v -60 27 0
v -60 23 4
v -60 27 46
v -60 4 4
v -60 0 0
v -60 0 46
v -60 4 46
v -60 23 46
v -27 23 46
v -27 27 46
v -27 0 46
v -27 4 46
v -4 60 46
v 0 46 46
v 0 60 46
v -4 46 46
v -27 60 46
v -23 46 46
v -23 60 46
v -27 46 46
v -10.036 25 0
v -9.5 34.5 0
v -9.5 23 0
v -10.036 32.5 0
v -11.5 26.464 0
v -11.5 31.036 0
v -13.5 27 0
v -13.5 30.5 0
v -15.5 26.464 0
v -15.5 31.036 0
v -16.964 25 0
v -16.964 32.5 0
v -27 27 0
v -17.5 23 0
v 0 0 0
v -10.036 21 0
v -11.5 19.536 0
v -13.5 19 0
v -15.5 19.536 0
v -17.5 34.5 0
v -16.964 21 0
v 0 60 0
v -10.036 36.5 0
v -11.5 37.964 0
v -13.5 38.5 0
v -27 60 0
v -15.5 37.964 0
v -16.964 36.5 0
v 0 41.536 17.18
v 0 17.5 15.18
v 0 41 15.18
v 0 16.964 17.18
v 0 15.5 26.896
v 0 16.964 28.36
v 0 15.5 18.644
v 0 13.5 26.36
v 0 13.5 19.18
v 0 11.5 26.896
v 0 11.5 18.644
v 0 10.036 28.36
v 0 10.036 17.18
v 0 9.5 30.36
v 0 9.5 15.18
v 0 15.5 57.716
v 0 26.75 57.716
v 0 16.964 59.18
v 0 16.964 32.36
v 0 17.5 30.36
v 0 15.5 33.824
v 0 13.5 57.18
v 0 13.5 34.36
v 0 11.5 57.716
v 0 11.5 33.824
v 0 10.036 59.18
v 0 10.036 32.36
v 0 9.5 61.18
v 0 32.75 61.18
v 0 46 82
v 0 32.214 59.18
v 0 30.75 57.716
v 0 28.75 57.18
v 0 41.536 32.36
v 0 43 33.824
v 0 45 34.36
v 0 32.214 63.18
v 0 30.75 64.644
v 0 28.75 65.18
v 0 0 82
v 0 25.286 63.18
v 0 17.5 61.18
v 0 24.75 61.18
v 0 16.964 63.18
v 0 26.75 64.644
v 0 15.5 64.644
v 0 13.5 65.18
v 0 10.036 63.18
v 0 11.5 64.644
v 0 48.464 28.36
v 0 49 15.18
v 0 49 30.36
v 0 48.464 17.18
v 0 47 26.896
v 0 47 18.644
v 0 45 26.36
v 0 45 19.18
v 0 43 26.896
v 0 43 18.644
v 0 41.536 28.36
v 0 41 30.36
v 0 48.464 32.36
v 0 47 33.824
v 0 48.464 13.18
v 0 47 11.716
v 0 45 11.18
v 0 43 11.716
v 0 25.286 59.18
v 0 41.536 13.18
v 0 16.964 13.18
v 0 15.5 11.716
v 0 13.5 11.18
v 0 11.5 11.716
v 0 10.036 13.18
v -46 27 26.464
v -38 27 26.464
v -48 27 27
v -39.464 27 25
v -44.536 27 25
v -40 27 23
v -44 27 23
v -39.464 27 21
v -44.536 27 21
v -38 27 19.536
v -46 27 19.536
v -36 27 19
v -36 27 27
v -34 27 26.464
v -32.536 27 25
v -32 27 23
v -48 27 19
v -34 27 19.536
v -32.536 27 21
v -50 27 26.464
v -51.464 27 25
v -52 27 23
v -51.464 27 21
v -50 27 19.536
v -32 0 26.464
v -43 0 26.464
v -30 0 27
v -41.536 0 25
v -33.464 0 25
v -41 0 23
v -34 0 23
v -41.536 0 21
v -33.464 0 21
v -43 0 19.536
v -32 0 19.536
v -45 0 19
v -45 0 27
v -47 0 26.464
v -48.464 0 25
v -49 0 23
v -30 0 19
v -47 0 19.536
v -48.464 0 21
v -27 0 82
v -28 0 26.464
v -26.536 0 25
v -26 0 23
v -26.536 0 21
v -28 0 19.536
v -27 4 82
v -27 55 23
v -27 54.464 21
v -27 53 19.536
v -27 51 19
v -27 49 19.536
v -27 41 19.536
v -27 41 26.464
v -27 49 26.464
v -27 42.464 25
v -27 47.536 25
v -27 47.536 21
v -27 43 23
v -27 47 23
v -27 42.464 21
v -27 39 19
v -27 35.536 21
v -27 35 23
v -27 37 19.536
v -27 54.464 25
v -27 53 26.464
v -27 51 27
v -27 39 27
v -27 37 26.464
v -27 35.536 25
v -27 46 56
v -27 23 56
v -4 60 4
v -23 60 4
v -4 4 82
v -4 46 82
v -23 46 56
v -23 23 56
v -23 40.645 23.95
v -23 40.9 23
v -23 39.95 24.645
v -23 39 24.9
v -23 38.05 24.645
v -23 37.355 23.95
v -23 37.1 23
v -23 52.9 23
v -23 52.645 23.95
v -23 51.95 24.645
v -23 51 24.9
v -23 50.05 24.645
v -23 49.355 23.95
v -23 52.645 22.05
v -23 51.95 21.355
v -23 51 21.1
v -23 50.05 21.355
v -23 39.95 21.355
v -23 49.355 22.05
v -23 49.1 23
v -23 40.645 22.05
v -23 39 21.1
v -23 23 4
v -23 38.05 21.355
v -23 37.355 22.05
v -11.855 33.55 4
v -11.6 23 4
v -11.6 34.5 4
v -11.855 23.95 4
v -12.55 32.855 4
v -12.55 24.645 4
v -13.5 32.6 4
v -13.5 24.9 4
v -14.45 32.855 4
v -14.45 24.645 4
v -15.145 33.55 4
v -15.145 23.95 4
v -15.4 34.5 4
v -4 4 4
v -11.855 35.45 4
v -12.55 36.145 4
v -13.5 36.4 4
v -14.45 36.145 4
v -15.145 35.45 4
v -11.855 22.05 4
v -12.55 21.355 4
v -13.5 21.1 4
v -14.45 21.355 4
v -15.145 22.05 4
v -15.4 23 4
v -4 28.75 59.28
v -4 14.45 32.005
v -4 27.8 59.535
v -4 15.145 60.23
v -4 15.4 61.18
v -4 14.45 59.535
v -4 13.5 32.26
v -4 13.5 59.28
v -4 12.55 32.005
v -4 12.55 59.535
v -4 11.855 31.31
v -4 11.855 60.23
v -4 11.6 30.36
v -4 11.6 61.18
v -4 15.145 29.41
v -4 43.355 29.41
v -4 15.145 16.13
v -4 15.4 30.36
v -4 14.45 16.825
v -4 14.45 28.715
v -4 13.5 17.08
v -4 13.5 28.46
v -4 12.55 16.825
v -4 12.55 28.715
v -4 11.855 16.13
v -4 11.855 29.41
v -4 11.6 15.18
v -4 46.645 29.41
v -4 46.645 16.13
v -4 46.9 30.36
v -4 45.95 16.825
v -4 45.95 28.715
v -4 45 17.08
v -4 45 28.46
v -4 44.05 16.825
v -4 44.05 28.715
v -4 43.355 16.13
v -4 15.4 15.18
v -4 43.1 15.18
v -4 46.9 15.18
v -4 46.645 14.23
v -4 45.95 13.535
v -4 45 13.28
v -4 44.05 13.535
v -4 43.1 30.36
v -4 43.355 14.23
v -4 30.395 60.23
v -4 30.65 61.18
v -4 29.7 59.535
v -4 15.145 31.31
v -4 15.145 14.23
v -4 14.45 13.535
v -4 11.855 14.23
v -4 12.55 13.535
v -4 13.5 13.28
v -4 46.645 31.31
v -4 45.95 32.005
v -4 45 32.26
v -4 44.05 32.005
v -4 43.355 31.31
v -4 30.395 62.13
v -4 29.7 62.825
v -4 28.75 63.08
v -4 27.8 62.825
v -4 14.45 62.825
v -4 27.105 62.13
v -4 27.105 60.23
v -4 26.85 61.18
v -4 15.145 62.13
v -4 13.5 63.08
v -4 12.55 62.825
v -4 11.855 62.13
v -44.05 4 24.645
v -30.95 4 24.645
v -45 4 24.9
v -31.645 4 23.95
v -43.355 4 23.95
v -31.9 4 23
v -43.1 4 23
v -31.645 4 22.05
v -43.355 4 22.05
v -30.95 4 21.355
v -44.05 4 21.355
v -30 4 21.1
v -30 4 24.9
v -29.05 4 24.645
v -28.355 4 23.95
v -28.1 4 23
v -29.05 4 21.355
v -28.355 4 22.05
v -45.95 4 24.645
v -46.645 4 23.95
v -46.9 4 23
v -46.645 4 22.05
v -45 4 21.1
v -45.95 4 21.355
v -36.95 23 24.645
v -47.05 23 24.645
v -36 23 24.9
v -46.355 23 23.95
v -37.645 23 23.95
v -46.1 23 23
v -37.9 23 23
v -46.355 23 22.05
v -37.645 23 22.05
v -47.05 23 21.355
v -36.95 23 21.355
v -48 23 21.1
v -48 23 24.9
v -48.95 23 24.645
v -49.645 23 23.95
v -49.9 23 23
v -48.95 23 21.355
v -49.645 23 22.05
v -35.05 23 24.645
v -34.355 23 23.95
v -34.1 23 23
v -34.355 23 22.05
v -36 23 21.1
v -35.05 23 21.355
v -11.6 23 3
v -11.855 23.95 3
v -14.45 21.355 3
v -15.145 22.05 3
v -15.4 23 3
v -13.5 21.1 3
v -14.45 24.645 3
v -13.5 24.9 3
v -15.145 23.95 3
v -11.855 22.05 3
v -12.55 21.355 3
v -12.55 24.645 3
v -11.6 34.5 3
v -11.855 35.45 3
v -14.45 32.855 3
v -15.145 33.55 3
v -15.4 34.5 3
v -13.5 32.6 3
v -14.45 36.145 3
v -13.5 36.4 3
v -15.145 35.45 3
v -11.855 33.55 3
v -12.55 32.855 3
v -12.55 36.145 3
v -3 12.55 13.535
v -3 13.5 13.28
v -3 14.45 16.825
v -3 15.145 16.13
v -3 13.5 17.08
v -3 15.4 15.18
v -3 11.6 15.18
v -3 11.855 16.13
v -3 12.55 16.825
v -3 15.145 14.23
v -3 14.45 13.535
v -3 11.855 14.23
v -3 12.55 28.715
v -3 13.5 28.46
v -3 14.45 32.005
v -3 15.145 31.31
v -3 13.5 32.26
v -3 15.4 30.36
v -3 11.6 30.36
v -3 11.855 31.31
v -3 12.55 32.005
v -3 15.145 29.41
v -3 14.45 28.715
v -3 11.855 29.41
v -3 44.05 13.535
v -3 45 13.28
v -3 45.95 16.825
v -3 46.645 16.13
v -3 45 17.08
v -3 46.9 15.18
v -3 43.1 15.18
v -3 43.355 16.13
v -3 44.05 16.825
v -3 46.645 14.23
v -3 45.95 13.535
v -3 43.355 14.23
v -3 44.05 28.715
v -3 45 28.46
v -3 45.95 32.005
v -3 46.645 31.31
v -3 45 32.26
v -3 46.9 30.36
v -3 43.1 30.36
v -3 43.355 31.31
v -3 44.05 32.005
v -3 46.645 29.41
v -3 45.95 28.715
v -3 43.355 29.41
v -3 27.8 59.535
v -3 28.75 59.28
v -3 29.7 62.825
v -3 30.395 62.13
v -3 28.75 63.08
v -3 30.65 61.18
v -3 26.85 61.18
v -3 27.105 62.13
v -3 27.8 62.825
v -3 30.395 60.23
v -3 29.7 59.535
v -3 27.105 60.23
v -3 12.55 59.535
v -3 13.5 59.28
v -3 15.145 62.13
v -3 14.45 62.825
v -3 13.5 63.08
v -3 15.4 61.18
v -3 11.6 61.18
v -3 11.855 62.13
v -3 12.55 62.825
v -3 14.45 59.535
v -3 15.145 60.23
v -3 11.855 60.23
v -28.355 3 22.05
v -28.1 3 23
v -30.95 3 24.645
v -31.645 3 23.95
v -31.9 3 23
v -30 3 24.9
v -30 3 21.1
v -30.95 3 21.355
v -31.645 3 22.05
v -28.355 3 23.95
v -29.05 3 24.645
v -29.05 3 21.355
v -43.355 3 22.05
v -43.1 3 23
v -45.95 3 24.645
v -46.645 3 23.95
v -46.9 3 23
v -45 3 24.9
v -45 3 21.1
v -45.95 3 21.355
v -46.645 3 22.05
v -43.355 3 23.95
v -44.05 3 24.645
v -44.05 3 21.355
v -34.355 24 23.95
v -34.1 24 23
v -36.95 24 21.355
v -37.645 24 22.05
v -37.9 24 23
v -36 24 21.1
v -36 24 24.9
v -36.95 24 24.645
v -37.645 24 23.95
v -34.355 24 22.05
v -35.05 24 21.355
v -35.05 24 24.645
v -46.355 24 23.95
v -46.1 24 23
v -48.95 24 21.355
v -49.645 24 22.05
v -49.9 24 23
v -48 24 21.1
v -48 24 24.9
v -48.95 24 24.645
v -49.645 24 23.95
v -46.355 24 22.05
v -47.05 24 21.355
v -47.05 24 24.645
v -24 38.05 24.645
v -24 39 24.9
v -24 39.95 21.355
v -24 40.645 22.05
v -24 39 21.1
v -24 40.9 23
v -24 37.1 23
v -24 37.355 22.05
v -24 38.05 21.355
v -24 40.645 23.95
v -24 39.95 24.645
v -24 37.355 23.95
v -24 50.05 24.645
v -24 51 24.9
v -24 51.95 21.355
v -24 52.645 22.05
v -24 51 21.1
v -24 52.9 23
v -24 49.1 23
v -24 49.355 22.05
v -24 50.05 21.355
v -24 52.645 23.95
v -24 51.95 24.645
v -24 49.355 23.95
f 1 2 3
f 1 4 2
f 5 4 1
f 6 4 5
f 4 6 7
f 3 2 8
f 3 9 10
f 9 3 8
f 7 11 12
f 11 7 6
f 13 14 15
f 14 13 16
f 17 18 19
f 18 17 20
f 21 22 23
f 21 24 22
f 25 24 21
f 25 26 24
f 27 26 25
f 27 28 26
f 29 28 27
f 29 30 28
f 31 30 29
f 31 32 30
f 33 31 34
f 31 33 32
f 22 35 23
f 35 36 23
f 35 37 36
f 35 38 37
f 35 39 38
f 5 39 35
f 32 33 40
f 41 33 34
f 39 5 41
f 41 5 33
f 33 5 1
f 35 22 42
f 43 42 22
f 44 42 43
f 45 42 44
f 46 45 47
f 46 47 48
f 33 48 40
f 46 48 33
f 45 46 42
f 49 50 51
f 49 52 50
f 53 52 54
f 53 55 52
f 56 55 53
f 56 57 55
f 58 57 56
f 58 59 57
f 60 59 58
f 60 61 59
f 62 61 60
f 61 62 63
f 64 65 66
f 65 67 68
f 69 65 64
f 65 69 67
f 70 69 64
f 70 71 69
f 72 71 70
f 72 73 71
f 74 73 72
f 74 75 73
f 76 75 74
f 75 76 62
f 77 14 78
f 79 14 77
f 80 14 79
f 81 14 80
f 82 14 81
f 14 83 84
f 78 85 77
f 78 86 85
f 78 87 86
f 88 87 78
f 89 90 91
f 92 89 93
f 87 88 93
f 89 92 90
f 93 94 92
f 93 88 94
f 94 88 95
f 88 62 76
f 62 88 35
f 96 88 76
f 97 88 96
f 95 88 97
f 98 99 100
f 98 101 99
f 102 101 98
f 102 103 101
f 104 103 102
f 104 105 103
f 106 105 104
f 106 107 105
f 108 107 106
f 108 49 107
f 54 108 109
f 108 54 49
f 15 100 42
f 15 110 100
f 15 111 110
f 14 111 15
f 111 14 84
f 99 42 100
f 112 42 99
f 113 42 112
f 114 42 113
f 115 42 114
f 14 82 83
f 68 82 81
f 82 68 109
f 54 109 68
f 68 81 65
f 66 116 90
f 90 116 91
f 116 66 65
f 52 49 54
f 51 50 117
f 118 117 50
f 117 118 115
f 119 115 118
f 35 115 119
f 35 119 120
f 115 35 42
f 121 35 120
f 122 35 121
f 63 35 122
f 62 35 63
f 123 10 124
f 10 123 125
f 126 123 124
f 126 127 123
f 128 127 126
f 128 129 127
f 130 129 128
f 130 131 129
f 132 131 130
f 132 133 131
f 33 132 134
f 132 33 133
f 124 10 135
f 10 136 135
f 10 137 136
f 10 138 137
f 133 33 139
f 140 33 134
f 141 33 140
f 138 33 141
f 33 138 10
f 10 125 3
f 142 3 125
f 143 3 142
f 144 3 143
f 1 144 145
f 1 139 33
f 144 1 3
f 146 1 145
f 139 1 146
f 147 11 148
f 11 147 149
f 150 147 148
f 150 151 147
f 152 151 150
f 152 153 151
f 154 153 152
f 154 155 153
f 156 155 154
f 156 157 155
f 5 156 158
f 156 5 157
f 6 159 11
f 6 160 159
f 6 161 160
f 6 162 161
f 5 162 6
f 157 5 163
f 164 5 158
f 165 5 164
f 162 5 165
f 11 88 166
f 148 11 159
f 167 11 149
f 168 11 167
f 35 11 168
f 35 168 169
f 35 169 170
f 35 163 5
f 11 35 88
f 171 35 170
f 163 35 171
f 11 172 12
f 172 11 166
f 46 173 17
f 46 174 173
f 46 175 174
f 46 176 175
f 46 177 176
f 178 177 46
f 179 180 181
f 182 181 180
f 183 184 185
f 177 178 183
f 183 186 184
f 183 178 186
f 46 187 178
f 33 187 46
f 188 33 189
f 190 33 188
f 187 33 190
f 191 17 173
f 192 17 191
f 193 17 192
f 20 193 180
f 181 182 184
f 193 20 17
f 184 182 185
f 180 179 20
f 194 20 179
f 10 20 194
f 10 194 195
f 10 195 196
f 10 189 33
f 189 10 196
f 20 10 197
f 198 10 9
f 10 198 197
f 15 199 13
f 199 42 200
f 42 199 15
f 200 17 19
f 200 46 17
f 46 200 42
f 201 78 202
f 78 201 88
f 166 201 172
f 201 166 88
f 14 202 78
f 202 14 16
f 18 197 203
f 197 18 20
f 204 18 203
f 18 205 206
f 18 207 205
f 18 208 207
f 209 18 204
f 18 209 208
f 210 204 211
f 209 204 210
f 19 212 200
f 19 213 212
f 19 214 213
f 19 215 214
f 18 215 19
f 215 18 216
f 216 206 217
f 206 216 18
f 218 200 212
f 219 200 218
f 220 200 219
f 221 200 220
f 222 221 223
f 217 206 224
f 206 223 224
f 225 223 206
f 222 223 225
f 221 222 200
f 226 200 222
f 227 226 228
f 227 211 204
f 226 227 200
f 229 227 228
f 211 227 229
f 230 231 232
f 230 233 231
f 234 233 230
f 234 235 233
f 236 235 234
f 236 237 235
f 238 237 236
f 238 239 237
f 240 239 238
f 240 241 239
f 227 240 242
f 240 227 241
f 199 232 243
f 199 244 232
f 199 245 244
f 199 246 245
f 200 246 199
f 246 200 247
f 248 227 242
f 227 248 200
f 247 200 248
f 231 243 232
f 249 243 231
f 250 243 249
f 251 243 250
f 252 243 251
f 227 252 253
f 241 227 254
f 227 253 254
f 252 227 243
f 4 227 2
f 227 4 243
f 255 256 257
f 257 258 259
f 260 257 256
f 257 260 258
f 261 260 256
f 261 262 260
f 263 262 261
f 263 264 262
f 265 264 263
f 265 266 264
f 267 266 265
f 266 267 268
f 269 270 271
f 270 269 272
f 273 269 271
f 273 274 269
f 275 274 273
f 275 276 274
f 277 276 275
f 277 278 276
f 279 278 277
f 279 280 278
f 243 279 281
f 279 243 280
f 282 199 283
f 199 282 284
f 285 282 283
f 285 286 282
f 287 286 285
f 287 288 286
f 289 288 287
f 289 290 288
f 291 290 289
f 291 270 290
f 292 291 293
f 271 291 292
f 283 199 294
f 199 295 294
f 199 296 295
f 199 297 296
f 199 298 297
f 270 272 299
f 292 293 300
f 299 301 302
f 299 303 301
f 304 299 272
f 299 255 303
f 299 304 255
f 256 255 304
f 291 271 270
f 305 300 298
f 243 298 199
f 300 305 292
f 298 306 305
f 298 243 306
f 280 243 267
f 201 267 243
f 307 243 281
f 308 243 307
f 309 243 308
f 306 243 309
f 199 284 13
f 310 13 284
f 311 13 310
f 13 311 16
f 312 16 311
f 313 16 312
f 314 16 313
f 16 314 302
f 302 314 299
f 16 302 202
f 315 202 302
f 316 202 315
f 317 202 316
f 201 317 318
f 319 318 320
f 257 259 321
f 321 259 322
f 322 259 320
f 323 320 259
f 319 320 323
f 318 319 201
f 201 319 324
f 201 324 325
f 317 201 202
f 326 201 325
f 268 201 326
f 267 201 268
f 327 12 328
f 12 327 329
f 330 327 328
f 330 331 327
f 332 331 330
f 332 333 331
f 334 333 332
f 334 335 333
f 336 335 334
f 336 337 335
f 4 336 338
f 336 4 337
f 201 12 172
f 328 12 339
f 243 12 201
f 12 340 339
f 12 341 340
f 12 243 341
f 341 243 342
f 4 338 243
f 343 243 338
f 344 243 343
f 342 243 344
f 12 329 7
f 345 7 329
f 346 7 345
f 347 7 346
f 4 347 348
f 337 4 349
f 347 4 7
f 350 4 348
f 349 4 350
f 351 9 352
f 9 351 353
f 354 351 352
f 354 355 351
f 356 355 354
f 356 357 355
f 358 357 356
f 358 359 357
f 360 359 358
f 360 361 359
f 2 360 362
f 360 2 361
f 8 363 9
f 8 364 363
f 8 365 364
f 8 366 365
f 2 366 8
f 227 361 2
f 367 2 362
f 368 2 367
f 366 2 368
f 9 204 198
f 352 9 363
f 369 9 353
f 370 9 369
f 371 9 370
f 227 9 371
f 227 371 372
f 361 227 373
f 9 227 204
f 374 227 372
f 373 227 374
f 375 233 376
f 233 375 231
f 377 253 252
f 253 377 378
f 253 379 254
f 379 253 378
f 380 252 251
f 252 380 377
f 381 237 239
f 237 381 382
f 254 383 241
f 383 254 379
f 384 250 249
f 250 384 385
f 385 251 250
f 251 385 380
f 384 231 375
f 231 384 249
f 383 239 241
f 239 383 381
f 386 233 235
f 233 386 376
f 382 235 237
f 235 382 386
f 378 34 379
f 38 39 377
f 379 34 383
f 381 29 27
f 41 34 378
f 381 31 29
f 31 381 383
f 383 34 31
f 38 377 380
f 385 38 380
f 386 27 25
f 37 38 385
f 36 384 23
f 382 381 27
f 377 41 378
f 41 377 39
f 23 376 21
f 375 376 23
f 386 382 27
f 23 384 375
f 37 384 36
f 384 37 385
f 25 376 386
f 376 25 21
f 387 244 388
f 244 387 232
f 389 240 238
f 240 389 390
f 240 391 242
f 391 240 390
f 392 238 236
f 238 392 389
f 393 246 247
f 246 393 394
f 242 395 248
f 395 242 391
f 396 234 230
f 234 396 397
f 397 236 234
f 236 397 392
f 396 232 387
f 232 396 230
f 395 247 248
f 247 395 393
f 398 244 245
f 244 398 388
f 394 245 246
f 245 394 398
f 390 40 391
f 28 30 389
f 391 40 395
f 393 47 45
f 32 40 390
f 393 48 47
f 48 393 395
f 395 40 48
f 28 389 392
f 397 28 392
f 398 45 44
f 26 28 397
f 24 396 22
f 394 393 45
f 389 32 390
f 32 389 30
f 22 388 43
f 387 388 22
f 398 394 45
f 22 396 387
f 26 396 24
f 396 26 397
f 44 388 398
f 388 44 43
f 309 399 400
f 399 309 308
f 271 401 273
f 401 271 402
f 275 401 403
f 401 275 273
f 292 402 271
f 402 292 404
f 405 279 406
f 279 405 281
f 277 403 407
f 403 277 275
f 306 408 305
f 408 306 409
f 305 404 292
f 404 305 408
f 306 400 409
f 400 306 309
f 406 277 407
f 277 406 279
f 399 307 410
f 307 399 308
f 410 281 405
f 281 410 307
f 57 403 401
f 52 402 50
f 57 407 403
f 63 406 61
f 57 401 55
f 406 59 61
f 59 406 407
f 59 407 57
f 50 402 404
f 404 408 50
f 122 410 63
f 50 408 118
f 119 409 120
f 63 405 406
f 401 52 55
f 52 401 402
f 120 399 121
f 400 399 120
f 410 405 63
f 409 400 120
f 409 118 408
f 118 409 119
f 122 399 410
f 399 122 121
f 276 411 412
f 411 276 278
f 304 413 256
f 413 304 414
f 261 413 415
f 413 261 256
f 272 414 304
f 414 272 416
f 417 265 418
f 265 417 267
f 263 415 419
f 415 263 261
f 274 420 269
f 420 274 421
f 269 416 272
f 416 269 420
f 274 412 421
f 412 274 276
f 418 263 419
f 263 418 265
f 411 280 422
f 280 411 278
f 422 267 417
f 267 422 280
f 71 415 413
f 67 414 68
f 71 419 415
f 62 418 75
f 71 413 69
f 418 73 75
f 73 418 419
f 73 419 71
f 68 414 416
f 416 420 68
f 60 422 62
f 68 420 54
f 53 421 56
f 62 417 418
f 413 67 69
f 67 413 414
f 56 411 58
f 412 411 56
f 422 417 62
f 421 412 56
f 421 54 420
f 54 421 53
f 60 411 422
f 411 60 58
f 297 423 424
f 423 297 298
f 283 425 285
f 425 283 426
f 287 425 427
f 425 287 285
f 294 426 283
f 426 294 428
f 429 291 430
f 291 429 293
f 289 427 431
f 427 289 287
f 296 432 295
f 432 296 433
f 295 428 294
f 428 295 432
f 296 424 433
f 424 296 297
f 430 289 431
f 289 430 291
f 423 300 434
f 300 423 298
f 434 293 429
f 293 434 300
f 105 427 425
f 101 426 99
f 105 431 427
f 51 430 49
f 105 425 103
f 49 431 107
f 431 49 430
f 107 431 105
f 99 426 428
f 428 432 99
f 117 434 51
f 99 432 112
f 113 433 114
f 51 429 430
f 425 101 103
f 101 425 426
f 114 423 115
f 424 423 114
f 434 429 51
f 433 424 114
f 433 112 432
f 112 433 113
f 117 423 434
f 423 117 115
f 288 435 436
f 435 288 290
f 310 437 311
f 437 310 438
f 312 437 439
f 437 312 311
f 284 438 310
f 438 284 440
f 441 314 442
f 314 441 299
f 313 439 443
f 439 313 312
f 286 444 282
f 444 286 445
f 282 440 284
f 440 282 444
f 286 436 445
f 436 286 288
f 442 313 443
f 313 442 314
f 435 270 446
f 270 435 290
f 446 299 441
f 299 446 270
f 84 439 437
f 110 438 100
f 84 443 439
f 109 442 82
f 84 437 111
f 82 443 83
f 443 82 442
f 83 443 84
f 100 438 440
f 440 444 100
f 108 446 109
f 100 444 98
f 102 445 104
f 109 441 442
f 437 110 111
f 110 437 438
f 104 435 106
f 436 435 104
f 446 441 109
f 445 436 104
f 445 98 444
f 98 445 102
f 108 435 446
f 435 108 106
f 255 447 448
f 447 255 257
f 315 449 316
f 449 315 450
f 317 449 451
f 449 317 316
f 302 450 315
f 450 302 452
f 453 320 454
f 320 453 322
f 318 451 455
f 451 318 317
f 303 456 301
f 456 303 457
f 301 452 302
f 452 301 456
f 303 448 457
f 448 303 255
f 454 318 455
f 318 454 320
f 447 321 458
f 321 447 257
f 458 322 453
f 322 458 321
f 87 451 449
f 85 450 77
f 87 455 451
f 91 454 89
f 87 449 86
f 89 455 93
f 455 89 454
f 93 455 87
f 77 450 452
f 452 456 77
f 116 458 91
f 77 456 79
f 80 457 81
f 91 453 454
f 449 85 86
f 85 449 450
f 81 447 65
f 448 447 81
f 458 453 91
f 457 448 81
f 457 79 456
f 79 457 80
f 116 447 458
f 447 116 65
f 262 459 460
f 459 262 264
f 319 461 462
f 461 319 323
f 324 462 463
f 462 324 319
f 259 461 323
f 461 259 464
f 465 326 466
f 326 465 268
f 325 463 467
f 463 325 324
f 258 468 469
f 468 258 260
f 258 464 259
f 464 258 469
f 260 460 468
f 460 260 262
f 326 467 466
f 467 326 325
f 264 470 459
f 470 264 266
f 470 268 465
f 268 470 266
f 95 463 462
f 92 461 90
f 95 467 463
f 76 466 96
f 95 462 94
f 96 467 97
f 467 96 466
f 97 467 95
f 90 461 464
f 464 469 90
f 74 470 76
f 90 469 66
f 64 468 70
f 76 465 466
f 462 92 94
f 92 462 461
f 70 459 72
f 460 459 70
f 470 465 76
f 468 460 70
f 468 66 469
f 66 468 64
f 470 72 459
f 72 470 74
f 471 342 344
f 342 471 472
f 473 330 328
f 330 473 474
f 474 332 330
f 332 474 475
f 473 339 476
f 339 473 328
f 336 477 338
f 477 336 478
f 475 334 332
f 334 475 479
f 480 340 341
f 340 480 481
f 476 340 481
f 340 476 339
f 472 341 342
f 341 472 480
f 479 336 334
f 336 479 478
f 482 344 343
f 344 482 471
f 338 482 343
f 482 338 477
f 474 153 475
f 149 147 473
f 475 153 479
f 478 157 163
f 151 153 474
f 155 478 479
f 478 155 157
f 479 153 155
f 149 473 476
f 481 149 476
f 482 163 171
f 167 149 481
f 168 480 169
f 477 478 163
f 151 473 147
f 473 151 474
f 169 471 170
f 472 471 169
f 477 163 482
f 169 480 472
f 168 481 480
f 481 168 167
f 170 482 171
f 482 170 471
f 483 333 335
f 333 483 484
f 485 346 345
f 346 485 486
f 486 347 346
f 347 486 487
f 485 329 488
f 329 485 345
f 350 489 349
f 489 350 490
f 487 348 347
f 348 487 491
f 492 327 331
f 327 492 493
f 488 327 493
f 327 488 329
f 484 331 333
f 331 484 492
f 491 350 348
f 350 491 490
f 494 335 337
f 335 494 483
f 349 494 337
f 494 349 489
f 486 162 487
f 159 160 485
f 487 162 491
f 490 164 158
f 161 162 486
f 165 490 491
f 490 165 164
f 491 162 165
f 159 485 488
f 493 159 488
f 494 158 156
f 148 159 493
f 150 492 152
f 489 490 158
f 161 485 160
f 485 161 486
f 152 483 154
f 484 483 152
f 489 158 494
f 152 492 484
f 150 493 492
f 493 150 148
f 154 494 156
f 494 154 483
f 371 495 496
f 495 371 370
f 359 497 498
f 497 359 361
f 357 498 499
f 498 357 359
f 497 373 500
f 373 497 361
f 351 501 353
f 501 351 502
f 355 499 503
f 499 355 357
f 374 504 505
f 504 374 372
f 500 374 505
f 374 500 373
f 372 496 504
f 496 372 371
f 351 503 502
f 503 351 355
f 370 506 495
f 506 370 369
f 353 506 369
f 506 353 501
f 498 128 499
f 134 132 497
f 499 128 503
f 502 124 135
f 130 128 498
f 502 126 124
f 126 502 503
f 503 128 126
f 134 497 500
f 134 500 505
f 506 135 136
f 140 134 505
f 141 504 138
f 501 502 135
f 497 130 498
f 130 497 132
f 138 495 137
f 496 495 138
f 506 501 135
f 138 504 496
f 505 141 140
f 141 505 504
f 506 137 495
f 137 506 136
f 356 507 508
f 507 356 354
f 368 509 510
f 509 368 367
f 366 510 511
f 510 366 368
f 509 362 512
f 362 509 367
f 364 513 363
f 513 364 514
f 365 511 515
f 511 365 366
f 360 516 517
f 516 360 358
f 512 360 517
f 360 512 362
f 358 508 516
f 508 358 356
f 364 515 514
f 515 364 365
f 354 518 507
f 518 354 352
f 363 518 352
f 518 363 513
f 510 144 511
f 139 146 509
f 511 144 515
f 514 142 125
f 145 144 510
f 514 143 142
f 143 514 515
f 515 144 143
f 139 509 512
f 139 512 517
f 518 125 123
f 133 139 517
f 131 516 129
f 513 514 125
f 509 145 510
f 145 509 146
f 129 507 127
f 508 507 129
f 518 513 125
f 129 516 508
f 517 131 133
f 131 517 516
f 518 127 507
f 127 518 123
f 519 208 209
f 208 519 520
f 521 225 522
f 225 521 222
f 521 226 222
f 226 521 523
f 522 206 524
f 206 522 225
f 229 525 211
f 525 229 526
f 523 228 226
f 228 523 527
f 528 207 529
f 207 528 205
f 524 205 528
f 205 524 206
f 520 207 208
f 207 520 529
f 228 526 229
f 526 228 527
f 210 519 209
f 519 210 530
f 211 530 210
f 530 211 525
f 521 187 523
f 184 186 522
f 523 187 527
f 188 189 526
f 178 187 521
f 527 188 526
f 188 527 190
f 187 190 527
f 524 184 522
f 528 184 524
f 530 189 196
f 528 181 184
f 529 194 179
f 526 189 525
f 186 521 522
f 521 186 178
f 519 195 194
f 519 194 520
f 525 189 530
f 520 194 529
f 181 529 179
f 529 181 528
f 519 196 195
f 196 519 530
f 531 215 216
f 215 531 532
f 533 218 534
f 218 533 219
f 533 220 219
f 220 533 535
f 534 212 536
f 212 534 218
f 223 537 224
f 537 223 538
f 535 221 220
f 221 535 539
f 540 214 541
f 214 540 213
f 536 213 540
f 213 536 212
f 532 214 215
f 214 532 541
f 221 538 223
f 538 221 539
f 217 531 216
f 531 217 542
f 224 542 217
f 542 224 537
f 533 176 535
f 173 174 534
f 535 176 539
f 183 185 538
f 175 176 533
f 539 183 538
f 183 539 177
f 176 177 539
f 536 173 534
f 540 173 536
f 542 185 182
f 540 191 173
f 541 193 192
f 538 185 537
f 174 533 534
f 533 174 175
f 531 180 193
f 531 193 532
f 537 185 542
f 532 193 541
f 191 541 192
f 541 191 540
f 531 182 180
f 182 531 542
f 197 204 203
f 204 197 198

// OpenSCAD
difference(){
	scale(v = [-1, 1, 1]) {
		union() {
			cube(size = [60, 27, 46]);
			cube(size = [27, 60, 46]);
			translate(v = [0, 0, 42]) {
				cube(size = [27, 46, 40]);
			}
			translate(v = [13.5000000000, 23.0000000000, 0]) {
				rotate(a = 180, v = [1, 0, 0]) {
				}
			}
			translate(v = [13.5000000000, 34.5000000000, 0]) {
				rotate(a = 180, v = [1, 0, 0]) {
				}
			}
			translate(v = [0, 13.5000000000, 15.1800000000]) {
				rotate(a = -90, v = [0, 1, 0]) {
				}
			}
			translate(v = [0, 13.5000000000, 30.3600000000]) {
				rotate(a = -90, v = [0, 1, 0]) {
				}
			}
			translate(v = [0, 45.0000000000, 15.1800000000]) {
				rotate(a = -90, v = [0, 1, 0]) {
				}
			}
			translate(v = [0, 45.0000000000, 30.3600000000]) {
				rotate(a = -90, v = [0, 1, 0]) {
				}
			}
			translate(v = [0, 28.7500000000, 61.1800000000]) {
				rotate(a = -90, v = [0, 1, 0]) {
				}
			}
			translate(v = [0, 13.5000000000, 61.1800000000]) {
				rotate(a = -90, v = [0, 1, 0]) {
				}
			}
			translate(v = [30.0000000000, 0, 23.0000000000]) {
				rotate(a = 90, v = [1, 0, 0]) {
				}
			}
			translate(v = [45.0000000000, 0, 23.0000000000]) {
				rotate(a = 90, v = [1, 0, 0]) {
				}
			}
			translate(v = [36.0000000000, 27, 23.0000000000]) {
				rotate(a = -90, v = [1, 0, 0]) {
				}
			}
			translate(v = [48.0000000000, 27, 23.0000000000]) {
				rotate(a = -90, v = [1, 0, 0]) {
				}
			}
			translate(v = [27, 39.0000000000, 23.0000000000]) {
				rotate(a = 90, v = [0, 1, 0]) {
				}
			}
			translate(v = [27, 51.0000000000, 23.0000000000]) {
				rotate(a = 90, v = [0, 1, 0]) {
				}
			}
		}
	}
	/* Holes Below*/
	scale(v = [-1, 1, 1]){
		union(){
			translate(v = [4, 4, 4]) {
				cube(size = [19, 60, 1000]);
				cube(size = [60, 19, 1000]);
			}
			translate(v = [4, 4, 56]) {
				cube(size = [100, 100, 100]);
			}
			translate(v = [13.5000000000, 23.0000000000, 0]){
				rotate(a = 180, v = [1, 0, 0]){
					union() {
						union() {
							translate(v = [0, 0, -5]) {
								cylinder($fn = 12, h = 5, r = 1.9000000000);
							}
							translate(v = [0, 0, -3]) {
								cylinder($fn = 12, h = 3, r1 = 1.9000000000, r2 = 4);
							}
						}
						cylinder($fn = 12, h = 1, r = 4);
					}
				}
			}
			translate(v = [13.5000000000, 34.5000000000, 0]){
				rotate(a = 180, v = [1, 0, 0]){
					union() {
						union() {
							translate(v = [0, 0, -5]) {
								cylinder($fn = 12, h = 5, r = 1.9000000000);
							}
							translate(v = [0, 0, -3]) {
								cylinder($fn = 12, h = 3, r1 = 1.9000000000, r2 = 4);
							}
						}
						cylinder($fn = 12, h = 1, r = 4);
					}
				}
			}
			translate(v = [0, 13.5000000000, 15.1800000000]){
				rotate(a = -90, v = [0, 1, 0]){
					union() {
						union() {
							translate(v = [0, 0, -5]) {
								cylinder($fn = 12, h = 5, r = 1.9000000000);
							}
							translate(v = [0, 0, -3]) {
								cylinder($fn = 12, h = 3, r1 = 1.9000000000, r2 = 4);
							}
						}
						cylinder($fn = 12, h = 1, r = 4);
					}
				}
			}
			translate(v = [0, 13.5000000000, 30.3600000000]){
				rotate(a = -90, v = [0, 1, 0]){
					union() {
						union() {
							translate(v = [0, 0, -5]) {
								cylinder($fn = 12, h = 5, r = 1.9000000000);
							}
							translate(v = [0, 0, -3]) {
								cylinder($fn = 12, h = 3, r1 = 1.9000000000, r2 = 4);
							}
						}
						cylinder($fn = 12, h = 1, r = 4);
					}
				}
			}
			translate(v = [0, 45.0000000000, 15.1800000000]){
				rotate(a = -90, v = [0, 1, 0]){
					union() {
						union() {
							translate(v = [0, 0, -5]) {
								cylinder($fn = 12, h = 5, r = 1.9000000000);
							}
							translate(v = [0, 0, -3]) {
								cylinder($fn = 12, h = 3, r1 = 1.9000000000, r2 = 4);
							}
						}
						cylinder($fn = 12, h = 1, r = 4);
					}
				}
			}
			translate(v = [0, 45.0000000000, 30.3600000000]){
				rotate(a = -90, v = [0, 1, 0]){
					union() {
						union() {
							translate(v = [0, 0, -5]) {
								cylinder($fn = 12, h = 5, r = 1.9000000000);
							}
							translate(v = [0, 0, -3]) {
								cylinder($fn = 12, h = 3, r1 = 1.9000000000, r2 = 4);
							}
						}
						cylinder($fn = 12, h = 1, r = 4);
					}
				}
			}
			translate(v = [0, 28.7500000000, 61.1800000000]){
				rotate(a = -90, v = [0, 1, 0]){
					union() {
						union() {
							translate(v = [0, 0, -5]) {
								cylinder($fn = 12, h = 5, r = 1.9000000000);
							}
							translate(v = [0, 0, -3]) {
								cylinder($fn = 12, h = 3, r1 = 1.9000000000, r2 = 4);
							}
						}
						cylinder($fn = 12, h = 1, r = 4);
					}
				}
			}
			translate(v = [0, 13.5000000000, 61.1800000000]){
				rotate(a = -90, v = [0, 1, 0]){
					union() {
						union() {
							translate(v = [0, 0, -5]) {
								cylinder($fn = 12, h = 5, r = 1.9000000000);
							}
							translate(v = [0, 0, -3]) {
								cylinder($fn = 12, h = 3, r1 = 1.9000000000, r2 = 4);
							}
						}
						cylinder($fn = 12, h = 1, r = 4);
					}
				}
			}
			translate(v = [30.0000000000, 0, 23.0000000000]){
				rotate(a = 90, v = [1, 0, 0]){
					union() {
						union() {
							translate(v = [0, 0, -5]) {
								cylinder($fn = 12, h = 5, r = 1.9000000000);
							}
							translate(v = [0, 0, -3]) {
								cylinder($fn = 12, h = 3, r1 = 1.9000000000, r2 = 4);
							}
						}
						cylinder($fn = 12, h = 1, r = 4);
					}
				}
			}
			translate(v = [45.0000000000, 0, 23.0000000000]){
				rotate(a = 90, v = [1, 0, 0]){
					union() {
						union() {
							translate(v = [0, 0, -5]) {
								cylinder($fn = 12, h = 5, r = 1.9000000000);
							}
							translate(v = [0, 0, -3]) {
								cylinder($fn = 12, h = 3, r1 = 1.9000000000, r2 = 4);
							}
						}
						cylinder($fn = 12, h = 1, r = 4);
					}
				}
			}
			translate(v = [36.0000000000, 27, 23.0000000000]){
				rotate(a = -90, v = [1, 0, 0]){
					union() {
						union() {
							translate(v = [0, 0, -5]) {
								cylinder($fn = 12, h = 5, r = 1.9000000000);
							}
							translate(v = [0, 0, -3]) {
								cylinder($fn = 12, h = 3, r1 = 1.9000000000, r2 = 4);
							}
						}
						cylinder($fn = 12, h = 1, r = 4);
					}
				}
			}
			translate(v = [48.0000000000, 27, 23.0000000000]){
				rotate(a = -90, v = [1, 0, 0]){
					union() {
						union() {
							translate(v = [0, 0, -5]) {
								cylinder($fn = 12, h = 5, r = 1.9000000000);
							}
							translate(v = [0, 0, -3]) {
								cylinder($fn = 12, h = 3, r1 = 1.9000000000, r2 = 4);
							}
						}
						cylinder($fn = 12, h = 1, r = 4);
					}
				}
			}
			translate(v = [27, 39.0000000000, 23.0000000000]){
				rotate(a = 90, v = [0, 1, 0]){
					union() {
						union() {
							translate(v = [0, 0, -5]) {
								cylinder($fn = 12, h = 5, r = 1.9000000000);
							}
							translate(v = [0, 0, -3]) {
								cylinder($fn = 12, h = 3, r1 = 1.9000000000, r2 = 4);
							}
						}
						cylinder($fn = 12, h = 1, r = 4);
					}
				}
			}
			translate(v = [27, 51.0000000000, 23.0000000000]){
				rotate(a = 90, v = [0, 1, 0]){
					union() {
						union() {
							translate(v = [0, 0, -5]) {
								cylinder($fn = 12, h = 5, r = 1.9000000000);
							}
							translate(v = [0, 0, -3]) {
								cylinder($fn = 12, h = 3, r1 = 1.9000000000, r2 = 4);
							}
						}
						cylinder($fn = 12, h = 1, r = 4);
					}
				}
			}
		}
	} /* End Holes */ 
}
